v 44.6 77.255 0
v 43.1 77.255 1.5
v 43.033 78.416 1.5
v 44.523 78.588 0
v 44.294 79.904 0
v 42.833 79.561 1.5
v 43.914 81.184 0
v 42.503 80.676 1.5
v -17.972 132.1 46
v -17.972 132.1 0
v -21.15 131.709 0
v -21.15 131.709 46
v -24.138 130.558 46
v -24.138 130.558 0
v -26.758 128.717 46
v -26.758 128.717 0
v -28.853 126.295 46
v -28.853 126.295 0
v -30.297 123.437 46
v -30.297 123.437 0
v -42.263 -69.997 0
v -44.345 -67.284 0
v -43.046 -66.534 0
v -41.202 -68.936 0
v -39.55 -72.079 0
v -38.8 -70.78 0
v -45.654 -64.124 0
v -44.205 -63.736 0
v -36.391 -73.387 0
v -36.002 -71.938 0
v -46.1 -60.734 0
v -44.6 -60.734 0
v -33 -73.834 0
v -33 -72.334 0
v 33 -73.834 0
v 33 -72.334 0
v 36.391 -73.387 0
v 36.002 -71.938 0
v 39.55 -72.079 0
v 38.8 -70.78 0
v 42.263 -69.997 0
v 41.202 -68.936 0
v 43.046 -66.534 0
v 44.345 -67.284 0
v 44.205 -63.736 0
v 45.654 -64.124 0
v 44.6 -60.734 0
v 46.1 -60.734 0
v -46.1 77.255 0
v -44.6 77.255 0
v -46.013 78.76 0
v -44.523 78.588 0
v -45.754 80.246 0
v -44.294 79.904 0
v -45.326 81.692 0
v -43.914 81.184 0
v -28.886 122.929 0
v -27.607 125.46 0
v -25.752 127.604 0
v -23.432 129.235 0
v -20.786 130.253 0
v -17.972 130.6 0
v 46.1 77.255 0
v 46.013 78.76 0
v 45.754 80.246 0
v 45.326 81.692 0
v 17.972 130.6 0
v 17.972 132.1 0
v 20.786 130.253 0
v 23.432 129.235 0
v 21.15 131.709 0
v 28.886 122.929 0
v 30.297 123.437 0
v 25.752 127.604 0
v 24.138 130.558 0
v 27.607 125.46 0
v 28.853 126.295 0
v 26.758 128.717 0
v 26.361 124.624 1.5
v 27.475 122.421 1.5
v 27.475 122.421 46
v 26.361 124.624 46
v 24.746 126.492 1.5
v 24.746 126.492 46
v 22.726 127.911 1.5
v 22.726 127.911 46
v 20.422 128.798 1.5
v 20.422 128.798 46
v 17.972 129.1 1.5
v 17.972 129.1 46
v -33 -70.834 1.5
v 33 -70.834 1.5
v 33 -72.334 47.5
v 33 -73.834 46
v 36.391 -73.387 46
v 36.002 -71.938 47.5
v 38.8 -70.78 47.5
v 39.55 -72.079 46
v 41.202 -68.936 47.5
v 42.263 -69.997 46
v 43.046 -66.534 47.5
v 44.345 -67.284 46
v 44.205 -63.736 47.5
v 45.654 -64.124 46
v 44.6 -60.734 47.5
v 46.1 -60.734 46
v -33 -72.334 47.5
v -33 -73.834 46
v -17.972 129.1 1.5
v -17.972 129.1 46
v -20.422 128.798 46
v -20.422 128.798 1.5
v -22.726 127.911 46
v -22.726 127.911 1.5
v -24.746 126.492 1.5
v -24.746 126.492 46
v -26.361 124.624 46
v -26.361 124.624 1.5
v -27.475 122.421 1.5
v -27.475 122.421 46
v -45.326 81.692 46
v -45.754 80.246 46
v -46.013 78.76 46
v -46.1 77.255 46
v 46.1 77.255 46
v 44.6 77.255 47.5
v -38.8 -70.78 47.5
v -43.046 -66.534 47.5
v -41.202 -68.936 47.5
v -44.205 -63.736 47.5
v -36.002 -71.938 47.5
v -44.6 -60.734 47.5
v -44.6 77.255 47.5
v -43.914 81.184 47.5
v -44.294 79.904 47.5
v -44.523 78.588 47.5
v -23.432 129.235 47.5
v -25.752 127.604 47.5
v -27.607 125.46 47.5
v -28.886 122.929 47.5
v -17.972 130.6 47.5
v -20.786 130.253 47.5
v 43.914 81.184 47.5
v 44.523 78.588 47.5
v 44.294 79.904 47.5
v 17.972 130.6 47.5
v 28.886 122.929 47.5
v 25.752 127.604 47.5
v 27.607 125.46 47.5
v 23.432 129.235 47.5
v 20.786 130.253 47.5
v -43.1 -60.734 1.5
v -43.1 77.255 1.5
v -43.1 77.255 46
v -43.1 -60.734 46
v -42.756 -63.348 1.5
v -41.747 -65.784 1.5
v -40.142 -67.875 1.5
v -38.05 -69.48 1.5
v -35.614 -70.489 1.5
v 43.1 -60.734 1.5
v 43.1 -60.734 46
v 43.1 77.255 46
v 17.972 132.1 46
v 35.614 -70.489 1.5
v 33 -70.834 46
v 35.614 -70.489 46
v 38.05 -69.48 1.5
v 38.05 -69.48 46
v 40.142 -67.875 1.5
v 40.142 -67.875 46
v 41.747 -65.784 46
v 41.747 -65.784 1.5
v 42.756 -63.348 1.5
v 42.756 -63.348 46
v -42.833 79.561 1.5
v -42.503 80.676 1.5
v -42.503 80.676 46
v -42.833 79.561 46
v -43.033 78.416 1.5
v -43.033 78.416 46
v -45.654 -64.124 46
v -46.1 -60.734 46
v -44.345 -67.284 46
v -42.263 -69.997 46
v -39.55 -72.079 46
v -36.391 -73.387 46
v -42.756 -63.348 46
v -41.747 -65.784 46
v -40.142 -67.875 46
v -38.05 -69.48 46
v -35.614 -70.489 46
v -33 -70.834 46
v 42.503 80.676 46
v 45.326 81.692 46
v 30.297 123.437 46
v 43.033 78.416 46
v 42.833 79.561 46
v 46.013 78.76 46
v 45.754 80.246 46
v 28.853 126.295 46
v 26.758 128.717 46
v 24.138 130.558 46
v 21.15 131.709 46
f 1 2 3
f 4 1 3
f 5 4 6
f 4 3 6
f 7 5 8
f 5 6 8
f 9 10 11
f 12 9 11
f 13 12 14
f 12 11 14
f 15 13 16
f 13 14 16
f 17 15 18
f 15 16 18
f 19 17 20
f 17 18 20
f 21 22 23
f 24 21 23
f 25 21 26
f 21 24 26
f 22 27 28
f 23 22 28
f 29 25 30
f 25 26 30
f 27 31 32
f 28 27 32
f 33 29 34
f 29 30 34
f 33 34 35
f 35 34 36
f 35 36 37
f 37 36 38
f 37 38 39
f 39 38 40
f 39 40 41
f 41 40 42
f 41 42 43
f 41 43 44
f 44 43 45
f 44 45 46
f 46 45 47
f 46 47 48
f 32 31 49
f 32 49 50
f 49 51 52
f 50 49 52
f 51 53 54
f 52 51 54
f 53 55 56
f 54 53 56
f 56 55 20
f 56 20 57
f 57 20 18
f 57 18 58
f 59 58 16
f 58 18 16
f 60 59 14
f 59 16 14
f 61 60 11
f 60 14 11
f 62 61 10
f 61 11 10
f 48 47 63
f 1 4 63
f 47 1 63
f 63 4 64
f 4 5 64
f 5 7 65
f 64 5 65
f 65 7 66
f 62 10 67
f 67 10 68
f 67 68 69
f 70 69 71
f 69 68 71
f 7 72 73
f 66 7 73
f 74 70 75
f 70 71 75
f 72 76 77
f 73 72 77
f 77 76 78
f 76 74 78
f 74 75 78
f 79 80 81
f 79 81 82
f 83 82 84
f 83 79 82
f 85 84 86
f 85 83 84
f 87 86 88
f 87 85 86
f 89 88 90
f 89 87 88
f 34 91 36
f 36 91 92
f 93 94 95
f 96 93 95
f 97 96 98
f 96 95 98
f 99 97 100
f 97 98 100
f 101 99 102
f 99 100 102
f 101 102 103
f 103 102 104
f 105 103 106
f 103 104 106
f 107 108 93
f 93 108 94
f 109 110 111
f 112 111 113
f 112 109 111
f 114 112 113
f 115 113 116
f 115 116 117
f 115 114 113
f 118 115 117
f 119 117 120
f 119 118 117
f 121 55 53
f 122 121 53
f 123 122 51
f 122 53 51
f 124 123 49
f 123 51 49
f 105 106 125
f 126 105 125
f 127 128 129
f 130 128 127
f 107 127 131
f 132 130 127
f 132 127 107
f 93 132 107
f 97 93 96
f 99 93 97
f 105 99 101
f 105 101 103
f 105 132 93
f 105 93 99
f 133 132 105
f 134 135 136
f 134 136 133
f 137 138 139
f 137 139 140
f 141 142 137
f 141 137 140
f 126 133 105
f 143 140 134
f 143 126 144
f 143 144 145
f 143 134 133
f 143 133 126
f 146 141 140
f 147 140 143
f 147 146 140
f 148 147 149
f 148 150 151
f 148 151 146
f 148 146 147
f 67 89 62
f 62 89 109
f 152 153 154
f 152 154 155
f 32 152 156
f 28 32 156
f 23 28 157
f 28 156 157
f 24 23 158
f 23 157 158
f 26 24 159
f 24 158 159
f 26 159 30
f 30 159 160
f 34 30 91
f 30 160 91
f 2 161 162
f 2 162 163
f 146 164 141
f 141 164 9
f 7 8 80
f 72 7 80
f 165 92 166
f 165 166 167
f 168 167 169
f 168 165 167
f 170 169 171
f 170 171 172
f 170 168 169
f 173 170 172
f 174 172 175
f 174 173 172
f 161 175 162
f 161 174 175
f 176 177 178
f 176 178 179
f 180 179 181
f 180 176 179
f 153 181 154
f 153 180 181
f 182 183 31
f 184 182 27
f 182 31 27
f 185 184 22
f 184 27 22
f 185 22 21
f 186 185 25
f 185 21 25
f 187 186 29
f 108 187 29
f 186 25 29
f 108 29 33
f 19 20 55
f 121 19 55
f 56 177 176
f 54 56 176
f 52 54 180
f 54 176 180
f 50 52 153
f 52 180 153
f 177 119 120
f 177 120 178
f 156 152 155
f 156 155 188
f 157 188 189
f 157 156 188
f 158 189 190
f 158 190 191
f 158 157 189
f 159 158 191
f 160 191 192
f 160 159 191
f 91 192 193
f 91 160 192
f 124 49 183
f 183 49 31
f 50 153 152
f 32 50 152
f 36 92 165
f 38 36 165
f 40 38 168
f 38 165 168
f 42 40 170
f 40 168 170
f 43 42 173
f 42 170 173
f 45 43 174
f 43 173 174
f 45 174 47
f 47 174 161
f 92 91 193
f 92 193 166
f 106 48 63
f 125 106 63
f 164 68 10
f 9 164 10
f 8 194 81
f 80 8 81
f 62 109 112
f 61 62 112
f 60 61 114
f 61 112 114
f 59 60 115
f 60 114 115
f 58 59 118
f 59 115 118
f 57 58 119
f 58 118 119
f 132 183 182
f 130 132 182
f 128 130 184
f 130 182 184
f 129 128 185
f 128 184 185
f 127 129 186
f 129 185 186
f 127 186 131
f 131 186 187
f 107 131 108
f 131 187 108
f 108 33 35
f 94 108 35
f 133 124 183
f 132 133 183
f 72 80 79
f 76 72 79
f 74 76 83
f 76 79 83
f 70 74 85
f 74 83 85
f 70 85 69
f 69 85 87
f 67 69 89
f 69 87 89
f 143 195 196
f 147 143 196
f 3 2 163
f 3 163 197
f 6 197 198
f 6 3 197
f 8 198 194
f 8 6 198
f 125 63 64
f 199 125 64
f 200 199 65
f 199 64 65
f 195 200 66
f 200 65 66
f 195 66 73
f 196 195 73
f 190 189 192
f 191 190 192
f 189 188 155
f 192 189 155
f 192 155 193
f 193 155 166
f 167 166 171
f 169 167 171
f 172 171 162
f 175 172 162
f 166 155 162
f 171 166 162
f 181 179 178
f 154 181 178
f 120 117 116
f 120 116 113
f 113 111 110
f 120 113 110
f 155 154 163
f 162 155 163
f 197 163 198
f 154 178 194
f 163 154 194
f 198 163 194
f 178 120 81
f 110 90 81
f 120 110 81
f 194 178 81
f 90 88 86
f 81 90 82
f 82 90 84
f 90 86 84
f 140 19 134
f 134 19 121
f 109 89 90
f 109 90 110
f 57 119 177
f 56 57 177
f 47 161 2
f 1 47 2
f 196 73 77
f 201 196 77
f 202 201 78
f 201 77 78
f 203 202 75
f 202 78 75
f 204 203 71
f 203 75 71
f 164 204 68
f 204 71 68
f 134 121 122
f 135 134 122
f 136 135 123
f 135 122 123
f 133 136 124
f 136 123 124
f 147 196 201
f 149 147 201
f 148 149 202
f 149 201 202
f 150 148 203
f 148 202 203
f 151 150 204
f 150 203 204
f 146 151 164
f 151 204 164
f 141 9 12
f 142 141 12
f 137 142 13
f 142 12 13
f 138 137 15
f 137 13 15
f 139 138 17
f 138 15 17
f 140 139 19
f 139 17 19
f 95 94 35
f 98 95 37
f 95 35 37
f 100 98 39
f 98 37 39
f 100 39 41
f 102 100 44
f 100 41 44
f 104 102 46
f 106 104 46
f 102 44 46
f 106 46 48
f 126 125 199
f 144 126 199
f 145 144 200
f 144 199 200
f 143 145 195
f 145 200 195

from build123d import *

# Parameters (mm, degrees)
BOSS_EXTRUDE1_DEPTH = 46
BOSS_EXTRUDE2_DEPTH = 1.5
CHAMFER1_SIZE       = 1.5


with BuildPart() as part:
    # Sketch1 → Boss-Extrude1 (new body)
    with BuildSketch(Plane.XY):
        with BuildLine():
            Line((-30.297360891, 123.437225034), (-45.325625095, 81.692046689))
            ThreePointArc((-45.325625095, 81.692046689), (-45.904954257, 79.506966326), (-46.1, 77.254821654))
            Line((-46.1, 77.254821654), (-46.1, -60.733642247))
            ThreePointArc((-46.1, -60.733642247), (-42.263098834, -69.99674108), (-33, -73.833642247))
            Line((-33, -73.833642247), (33, -73.833642247))
            ThreePointArc((33, -73.833642247), (42.263098834, -69.99674108), (46.1, -60.733642247))
            Line((46.1, -60.733642247), (46.1, 77.254821654))
            ThreePointArc((46.1, 77.254821654), (45.904954257, 79.506966326), (45.325625095, 81.692046689))
            Line((45.325625095, 81.692046689), (30.297360891, 123.437225034))
            ThreePointArc((30.297360891, 123.437225034), (25.504409692, 129.717687436), (17.971735796, 132.1))
            Line((17.971735796, 132.1), (-17.971735796, 132.1))
            ThreePointArc((-17.971735796, 132.1), (-25.504409692, 129.717687436), (-30.297360891, 123.437225034))
        make_face()
        with BuildLine():
            Line((-27.474698655, 122.42106663), (-42.50296286, 80.675888284))
            ThreePointArc((-42.50296286, 80.675888284), (-42.949621221, 78.991208005), (-43.1, 77.254821654))
            Line((-43.1, 77.254821654), (-43.1, -60.733642247))
            ThreePointArc((-43.1, -60.733642247), (-40.14177849, -67.875420737), (-33, -70.833642247))
            Line((-33, -70.833642247), (33, -70.833642247))
            ThreePointArc((33, -70.833642247), (40.14177849, -67.875420737), (43.1, -60.733642247))
            Line((43.1, -60.733642247), (43.1, 77.254821654))
            ThreePointArc((43.1, 77.254821654), (42.949621221, 78.991208005), (42.50296286, 80.675888284))
            Line((42.50296286, 80.675888284), (27.474698655, 122.42106663))
            ThreePointArc((27.474698655, 122.42106663), (23.779369868, 127.263255199), (17.971735796, 129.1))
            Line((17.971735796, 129.1), (-17.971735796, 129.1))
            ThreePointArc((-17.971735796, 129.1), (-23.779369868, 127.263255199), (-27.474698655, 122.42106663))
        make_face(mode=Mode.SUBTRACT)
    extrude(amount=BOSS_EXTRUDE1_DEPTH)

    # Sketch2 → Boss-Extrude2 (add)
    with BuildSketch(Plane.XY.offset(46)):
        with BuildLine():
            Line((17.971735796, 132.1), (-17.971735796, 132.1))
            ThreePointArc((-17.971735796, 132.1), (-25.504409692, 129.717687436), (-30.297360891, 123.437225034))
            Line((-30.297360891, 123.437225034), (-45.325625095, 81.692046689))
            ThreePointArc((-45.325625095, 81.692046689), (-45.904954257, 79.506966326), (-46.1, 77.254821654))
            Line((-46.1, 77.254821654), (-46.1, -60.733642247))
            ThreePointArc((-46.1, -60.733642247), (-42.263098834, -69.99674108), (-33, -73.833642247))
            Line((-33, -73.833642247), (33, -73.833642247))
            ThreePointArc((33, -73.833642247), (42.263098834, -69.99674108), (46.1, -60.733642247))
            Line((46.1, -60.733642247), (46.1, 77.254821654))
            ThreePointArc((46.1, 77.254821654), (45.904954257, 79.506966326), (45.325625095, 81.692046689))
            Line((45.325625095, 81.692046689), (30.297360891, 123.437225034))
            ThreePointArc((30.297360891, 123.437225034), (25.504409692, 129.717687436), (17.971735796, 132.1))
        make_face()
    extrude(amount=BOSS_EXTRUDE2_DEPTH)

    # Chamfer1
    chamfer1_edges = [part.edges().sort_by_distance(p)[0] for p in [
        (-23.779369868, 127.263255199, 0),
        (-34.988830758, 101.548477457, 0),
        (-42.949621221, 78.991208005, 0),
        (-43.1, 8.260589704, 0),
        (-40.14177849, -67.875420737, 0),
        (0, -70.833642247, 0),
        (40.14177849, -67.875420737, 0),
        (43.1, 8.260589704, 0),
        (42.949621221, 78.991208005, 0),
        (34.988830758, 101.548477457, 0),
        (23.779369868, 127.263255199, 0),
        (0, 129.1, 0),
        (25.504409692, 129.717687436, 47.5),
        (0, 132.1, 47.5),
        (-25.504409692, 129.717687436, 47.5),
        (-37.811492993, 102.564635861, 47.5),
        (-45.904954257, 79.506966326, 47.5),
        (-46.1, 8.260589704, 47.5),
        (-42.263098834, -69.99674108, 47.5),
        (0, -73.833642247, 47.5),
        (42.263098834, -69.99674108, 47.5),
        (46.1, 8.260589704, 47.5),
        (45.904954257, 79.506966326, 47.5),
        (37.811492993, 102.564635861, 47.5),
    ]]
    chamfer(chamfer1_edges, length=CHAMFER1_SIZE)


solid = part.part
